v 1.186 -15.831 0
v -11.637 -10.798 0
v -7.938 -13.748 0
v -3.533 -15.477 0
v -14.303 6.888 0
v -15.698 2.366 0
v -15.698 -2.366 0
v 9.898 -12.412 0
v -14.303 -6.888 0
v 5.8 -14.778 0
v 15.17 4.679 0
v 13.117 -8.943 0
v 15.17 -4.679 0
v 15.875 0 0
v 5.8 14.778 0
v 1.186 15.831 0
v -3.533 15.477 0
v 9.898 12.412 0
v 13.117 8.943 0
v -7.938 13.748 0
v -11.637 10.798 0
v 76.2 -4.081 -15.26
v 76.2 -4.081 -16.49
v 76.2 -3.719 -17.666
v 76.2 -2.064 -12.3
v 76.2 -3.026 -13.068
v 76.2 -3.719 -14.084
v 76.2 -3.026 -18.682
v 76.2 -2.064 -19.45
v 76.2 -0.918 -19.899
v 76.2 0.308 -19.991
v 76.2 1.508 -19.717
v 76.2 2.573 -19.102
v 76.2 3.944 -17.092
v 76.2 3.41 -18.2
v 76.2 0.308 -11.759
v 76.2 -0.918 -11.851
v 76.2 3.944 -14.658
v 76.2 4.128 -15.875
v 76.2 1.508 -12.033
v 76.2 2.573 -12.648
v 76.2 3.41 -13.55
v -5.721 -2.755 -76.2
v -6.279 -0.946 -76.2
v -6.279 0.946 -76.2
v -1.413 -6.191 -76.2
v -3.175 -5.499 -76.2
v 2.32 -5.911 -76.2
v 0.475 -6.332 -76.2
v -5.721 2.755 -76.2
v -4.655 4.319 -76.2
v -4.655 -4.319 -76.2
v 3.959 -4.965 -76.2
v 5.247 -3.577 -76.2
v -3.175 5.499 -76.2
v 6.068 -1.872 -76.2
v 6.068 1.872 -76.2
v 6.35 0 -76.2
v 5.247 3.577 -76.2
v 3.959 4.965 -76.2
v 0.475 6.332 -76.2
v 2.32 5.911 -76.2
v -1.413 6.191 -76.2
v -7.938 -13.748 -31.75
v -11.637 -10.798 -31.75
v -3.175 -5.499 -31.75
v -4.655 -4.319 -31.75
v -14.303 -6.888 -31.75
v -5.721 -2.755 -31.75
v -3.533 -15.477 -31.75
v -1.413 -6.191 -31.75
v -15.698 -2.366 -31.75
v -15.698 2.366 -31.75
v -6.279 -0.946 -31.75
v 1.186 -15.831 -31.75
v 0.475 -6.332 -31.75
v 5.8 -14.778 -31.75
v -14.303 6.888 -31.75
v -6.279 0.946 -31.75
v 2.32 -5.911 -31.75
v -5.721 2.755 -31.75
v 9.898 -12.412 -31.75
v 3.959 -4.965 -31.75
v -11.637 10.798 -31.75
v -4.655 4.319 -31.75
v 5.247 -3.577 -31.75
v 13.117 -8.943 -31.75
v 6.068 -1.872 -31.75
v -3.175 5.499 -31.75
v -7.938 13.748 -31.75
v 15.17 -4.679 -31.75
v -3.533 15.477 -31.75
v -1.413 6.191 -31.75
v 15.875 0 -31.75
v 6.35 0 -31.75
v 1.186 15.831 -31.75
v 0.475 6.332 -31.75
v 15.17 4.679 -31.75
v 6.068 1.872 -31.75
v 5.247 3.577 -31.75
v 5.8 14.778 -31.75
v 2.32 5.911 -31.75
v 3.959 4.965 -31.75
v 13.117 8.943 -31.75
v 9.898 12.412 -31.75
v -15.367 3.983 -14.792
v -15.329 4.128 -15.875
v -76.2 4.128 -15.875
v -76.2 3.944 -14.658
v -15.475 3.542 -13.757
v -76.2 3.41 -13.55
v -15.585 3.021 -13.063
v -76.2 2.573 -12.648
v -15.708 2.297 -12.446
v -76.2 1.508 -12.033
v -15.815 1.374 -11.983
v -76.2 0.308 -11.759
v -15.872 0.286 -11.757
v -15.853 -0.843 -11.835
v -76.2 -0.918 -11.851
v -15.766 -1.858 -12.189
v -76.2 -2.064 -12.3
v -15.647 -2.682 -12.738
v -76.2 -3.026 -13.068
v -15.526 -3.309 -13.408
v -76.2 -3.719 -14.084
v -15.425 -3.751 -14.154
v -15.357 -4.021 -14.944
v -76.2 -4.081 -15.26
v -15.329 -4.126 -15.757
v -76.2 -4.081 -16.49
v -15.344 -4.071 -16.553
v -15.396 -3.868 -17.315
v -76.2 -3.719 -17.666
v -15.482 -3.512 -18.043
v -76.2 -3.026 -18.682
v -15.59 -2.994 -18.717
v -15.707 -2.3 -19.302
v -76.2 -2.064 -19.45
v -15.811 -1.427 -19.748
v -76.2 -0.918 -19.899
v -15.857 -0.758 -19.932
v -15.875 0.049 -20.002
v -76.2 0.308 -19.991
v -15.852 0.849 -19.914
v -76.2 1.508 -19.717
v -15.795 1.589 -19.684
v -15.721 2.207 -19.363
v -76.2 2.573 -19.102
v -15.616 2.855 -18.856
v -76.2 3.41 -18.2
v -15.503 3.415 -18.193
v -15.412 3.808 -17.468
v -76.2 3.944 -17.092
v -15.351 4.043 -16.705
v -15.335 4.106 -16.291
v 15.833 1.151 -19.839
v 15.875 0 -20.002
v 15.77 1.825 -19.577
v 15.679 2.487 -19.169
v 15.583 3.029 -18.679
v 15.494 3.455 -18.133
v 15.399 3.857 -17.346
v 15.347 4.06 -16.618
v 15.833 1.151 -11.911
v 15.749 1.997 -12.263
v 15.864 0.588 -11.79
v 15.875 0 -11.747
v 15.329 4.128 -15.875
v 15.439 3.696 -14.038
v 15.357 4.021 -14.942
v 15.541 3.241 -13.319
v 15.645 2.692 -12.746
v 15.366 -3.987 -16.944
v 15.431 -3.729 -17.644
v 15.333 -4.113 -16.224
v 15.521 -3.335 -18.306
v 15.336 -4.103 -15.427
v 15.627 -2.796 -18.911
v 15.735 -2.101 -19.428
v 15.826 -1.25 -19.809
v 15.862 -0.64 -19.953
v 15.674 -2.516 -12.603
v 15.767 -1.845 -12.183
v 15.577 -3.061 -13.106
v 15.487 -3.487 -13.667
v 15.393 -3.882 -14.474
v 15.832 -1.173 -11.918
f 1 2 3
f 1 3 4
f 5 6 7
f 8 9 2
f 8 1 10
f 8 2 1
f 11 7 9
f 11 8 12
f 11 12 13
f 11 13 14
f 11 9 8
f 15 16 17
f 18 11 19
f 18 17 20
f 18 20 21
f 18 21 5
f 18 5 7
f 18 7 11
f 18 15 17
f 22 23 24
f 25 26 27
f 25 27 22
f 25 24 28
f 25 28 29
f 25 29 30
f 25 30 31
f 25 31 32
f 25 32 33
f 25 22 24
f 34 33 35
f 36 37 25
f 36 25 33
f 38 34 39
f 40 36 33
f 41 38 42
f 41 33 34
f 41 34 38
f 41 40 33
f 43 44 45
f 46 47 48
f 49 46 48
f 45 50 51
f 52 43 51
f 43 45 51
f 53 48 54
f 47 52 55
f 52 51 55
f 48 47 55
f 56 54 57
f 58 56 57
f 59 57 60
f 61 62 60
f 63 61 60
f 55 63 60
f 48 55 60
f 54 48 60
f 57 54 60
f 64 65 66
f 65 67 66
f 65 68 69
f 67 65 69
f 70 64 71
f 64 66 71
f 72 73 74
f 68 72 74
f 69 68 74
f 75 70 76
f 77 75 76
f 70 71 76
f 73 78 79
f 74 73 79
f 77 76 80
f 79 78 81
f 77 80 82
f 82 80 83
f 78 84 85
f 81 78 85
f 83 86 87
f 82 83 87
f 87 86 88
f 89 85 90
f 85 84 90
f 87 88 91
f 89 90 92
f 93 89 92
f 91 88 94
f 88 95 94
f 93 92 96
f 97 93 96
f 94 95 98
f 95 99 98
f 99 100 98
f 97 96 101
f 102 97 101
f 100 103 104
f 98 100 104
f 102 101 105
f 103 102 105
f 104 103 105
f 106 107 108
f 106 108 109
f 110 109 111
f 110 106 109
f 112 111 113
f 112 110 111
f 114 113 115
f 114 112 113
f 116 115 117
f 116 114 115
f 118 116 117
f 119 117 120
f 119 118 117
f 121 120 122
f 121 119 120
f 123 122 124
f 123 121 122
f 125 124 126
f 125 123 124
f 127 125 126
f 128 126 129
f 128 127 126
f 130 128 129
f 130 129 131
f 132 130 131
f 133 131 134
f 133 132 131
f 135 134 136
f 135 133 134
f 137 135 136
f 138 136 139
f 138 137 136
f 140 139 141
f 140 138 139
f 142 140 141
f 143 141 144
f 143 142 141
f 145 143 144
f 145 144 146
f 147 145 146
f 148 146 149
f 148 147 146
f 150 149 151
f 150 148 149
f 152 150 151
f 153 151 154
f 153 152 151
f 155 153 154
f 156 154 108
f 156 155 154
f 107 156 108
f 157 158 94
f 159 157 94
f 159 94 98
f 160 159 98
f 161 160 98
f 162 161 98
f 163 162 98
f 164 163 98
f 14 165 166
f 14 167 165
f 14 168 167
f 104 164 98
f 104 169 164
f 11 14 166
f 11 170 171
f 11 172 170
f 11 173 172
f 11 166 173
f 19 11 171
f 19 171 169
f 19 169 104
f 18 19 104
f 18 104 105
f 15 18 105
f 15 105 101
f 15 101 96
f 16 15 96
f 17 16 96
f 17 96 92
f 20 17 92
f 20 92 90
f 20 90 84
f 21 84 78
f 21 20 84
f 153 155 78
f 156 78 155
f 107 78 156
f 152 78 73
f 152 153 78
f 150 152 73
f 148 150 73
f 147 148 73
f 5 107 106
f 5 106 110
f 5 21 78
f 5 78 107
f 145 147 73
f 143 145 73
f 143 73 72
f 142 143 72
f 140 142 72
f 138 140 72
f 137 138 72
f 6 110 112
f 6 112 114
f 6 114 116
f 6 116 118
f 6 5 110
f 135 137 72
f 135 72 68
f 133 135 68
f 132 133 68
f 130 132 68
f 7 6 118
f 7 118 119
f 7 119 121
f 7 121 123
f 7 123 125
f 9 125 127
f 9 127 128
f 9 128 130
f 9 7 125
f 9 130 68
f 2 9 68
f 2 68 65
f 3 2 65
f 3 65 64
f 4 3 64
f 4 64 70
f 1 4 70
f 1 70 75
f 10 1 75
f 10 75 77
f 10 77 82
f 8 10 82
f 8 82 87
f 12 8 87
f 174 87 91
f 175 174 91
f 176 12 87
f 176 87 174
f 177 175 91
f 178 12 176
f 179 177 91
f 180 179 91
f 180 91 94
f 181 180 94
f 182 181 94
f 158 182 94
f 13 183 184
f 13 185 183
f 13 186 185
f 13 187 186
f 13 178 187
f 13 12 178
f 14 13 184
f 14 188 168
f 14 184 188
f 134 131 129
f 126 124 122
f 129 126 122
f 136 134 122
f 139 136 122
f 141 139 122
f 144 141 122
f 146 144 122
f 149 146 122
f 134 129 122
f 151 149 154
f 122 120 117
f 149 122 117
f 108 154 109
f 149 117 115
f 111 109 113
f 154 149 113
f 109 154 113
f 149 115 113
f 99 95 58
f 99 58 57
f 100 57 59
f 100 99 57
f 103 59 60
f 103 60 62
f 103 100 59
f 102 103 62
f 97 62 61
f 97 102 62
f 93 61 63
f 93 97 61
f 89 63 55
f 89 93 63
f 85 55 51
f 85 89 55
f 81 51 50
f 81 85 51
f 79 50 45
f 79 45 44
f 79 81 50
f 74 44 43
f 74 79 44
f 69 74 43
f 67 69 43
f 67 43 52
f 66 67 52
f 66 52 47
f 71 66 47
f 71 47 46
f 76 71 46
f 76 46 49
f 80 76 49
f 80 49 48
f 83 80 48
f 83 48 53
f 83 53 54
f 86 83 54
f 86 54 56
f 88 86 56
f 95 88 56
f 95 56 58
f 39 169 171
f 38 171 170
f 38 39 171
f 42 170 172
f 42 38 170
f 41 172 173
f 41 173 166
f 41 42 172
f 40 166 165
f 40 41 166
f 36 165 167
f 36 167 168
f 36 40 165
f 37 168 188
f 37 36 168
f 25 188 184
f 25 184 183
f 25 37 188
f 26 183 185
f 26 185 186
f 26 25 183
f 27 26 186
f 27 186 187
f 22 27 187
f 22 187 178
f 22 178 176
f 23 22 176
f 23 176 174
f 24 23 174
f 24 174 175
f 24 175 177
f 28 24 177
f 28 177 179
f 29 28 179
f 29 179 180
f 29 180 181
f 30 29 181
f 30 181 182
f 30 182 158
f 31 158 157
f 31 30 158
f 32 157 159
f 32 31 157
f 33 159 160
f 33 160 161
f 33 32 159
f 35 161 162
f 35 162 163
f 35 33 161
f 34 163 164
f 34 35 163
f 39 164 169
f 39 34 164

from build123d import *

# Parameters (mm, degrees)
F0_R     = 15.875
F1_DEPTH = 31.75
F2_R     = 6.35
F3_DEPTH = 76.2
F4_R     = 4.1275
F5_DEPTH = 76.2


with BuildPart() as f1:
    # F0 (on Top) → F1 (new body)
    with BuildSketch(Plane.XY):
        Circle(F0_R)
    extrude(amount=-F1_DEPTH)

    # F2 (on Top) → F3 (join)
    with BuildSketch(Plane.XY):
        Circle(F2_R)
    extrude(amount=-F3_DEPTH)

    # F4 (on Right) → F5 (join, symmetric)
    with BuildSketch(Plane.YZ):
        with Locations((0, -15.875)):
            Circle(F4_R)
    extrude(amount=F5_DEPTH, both=True)


solid = f1.part
